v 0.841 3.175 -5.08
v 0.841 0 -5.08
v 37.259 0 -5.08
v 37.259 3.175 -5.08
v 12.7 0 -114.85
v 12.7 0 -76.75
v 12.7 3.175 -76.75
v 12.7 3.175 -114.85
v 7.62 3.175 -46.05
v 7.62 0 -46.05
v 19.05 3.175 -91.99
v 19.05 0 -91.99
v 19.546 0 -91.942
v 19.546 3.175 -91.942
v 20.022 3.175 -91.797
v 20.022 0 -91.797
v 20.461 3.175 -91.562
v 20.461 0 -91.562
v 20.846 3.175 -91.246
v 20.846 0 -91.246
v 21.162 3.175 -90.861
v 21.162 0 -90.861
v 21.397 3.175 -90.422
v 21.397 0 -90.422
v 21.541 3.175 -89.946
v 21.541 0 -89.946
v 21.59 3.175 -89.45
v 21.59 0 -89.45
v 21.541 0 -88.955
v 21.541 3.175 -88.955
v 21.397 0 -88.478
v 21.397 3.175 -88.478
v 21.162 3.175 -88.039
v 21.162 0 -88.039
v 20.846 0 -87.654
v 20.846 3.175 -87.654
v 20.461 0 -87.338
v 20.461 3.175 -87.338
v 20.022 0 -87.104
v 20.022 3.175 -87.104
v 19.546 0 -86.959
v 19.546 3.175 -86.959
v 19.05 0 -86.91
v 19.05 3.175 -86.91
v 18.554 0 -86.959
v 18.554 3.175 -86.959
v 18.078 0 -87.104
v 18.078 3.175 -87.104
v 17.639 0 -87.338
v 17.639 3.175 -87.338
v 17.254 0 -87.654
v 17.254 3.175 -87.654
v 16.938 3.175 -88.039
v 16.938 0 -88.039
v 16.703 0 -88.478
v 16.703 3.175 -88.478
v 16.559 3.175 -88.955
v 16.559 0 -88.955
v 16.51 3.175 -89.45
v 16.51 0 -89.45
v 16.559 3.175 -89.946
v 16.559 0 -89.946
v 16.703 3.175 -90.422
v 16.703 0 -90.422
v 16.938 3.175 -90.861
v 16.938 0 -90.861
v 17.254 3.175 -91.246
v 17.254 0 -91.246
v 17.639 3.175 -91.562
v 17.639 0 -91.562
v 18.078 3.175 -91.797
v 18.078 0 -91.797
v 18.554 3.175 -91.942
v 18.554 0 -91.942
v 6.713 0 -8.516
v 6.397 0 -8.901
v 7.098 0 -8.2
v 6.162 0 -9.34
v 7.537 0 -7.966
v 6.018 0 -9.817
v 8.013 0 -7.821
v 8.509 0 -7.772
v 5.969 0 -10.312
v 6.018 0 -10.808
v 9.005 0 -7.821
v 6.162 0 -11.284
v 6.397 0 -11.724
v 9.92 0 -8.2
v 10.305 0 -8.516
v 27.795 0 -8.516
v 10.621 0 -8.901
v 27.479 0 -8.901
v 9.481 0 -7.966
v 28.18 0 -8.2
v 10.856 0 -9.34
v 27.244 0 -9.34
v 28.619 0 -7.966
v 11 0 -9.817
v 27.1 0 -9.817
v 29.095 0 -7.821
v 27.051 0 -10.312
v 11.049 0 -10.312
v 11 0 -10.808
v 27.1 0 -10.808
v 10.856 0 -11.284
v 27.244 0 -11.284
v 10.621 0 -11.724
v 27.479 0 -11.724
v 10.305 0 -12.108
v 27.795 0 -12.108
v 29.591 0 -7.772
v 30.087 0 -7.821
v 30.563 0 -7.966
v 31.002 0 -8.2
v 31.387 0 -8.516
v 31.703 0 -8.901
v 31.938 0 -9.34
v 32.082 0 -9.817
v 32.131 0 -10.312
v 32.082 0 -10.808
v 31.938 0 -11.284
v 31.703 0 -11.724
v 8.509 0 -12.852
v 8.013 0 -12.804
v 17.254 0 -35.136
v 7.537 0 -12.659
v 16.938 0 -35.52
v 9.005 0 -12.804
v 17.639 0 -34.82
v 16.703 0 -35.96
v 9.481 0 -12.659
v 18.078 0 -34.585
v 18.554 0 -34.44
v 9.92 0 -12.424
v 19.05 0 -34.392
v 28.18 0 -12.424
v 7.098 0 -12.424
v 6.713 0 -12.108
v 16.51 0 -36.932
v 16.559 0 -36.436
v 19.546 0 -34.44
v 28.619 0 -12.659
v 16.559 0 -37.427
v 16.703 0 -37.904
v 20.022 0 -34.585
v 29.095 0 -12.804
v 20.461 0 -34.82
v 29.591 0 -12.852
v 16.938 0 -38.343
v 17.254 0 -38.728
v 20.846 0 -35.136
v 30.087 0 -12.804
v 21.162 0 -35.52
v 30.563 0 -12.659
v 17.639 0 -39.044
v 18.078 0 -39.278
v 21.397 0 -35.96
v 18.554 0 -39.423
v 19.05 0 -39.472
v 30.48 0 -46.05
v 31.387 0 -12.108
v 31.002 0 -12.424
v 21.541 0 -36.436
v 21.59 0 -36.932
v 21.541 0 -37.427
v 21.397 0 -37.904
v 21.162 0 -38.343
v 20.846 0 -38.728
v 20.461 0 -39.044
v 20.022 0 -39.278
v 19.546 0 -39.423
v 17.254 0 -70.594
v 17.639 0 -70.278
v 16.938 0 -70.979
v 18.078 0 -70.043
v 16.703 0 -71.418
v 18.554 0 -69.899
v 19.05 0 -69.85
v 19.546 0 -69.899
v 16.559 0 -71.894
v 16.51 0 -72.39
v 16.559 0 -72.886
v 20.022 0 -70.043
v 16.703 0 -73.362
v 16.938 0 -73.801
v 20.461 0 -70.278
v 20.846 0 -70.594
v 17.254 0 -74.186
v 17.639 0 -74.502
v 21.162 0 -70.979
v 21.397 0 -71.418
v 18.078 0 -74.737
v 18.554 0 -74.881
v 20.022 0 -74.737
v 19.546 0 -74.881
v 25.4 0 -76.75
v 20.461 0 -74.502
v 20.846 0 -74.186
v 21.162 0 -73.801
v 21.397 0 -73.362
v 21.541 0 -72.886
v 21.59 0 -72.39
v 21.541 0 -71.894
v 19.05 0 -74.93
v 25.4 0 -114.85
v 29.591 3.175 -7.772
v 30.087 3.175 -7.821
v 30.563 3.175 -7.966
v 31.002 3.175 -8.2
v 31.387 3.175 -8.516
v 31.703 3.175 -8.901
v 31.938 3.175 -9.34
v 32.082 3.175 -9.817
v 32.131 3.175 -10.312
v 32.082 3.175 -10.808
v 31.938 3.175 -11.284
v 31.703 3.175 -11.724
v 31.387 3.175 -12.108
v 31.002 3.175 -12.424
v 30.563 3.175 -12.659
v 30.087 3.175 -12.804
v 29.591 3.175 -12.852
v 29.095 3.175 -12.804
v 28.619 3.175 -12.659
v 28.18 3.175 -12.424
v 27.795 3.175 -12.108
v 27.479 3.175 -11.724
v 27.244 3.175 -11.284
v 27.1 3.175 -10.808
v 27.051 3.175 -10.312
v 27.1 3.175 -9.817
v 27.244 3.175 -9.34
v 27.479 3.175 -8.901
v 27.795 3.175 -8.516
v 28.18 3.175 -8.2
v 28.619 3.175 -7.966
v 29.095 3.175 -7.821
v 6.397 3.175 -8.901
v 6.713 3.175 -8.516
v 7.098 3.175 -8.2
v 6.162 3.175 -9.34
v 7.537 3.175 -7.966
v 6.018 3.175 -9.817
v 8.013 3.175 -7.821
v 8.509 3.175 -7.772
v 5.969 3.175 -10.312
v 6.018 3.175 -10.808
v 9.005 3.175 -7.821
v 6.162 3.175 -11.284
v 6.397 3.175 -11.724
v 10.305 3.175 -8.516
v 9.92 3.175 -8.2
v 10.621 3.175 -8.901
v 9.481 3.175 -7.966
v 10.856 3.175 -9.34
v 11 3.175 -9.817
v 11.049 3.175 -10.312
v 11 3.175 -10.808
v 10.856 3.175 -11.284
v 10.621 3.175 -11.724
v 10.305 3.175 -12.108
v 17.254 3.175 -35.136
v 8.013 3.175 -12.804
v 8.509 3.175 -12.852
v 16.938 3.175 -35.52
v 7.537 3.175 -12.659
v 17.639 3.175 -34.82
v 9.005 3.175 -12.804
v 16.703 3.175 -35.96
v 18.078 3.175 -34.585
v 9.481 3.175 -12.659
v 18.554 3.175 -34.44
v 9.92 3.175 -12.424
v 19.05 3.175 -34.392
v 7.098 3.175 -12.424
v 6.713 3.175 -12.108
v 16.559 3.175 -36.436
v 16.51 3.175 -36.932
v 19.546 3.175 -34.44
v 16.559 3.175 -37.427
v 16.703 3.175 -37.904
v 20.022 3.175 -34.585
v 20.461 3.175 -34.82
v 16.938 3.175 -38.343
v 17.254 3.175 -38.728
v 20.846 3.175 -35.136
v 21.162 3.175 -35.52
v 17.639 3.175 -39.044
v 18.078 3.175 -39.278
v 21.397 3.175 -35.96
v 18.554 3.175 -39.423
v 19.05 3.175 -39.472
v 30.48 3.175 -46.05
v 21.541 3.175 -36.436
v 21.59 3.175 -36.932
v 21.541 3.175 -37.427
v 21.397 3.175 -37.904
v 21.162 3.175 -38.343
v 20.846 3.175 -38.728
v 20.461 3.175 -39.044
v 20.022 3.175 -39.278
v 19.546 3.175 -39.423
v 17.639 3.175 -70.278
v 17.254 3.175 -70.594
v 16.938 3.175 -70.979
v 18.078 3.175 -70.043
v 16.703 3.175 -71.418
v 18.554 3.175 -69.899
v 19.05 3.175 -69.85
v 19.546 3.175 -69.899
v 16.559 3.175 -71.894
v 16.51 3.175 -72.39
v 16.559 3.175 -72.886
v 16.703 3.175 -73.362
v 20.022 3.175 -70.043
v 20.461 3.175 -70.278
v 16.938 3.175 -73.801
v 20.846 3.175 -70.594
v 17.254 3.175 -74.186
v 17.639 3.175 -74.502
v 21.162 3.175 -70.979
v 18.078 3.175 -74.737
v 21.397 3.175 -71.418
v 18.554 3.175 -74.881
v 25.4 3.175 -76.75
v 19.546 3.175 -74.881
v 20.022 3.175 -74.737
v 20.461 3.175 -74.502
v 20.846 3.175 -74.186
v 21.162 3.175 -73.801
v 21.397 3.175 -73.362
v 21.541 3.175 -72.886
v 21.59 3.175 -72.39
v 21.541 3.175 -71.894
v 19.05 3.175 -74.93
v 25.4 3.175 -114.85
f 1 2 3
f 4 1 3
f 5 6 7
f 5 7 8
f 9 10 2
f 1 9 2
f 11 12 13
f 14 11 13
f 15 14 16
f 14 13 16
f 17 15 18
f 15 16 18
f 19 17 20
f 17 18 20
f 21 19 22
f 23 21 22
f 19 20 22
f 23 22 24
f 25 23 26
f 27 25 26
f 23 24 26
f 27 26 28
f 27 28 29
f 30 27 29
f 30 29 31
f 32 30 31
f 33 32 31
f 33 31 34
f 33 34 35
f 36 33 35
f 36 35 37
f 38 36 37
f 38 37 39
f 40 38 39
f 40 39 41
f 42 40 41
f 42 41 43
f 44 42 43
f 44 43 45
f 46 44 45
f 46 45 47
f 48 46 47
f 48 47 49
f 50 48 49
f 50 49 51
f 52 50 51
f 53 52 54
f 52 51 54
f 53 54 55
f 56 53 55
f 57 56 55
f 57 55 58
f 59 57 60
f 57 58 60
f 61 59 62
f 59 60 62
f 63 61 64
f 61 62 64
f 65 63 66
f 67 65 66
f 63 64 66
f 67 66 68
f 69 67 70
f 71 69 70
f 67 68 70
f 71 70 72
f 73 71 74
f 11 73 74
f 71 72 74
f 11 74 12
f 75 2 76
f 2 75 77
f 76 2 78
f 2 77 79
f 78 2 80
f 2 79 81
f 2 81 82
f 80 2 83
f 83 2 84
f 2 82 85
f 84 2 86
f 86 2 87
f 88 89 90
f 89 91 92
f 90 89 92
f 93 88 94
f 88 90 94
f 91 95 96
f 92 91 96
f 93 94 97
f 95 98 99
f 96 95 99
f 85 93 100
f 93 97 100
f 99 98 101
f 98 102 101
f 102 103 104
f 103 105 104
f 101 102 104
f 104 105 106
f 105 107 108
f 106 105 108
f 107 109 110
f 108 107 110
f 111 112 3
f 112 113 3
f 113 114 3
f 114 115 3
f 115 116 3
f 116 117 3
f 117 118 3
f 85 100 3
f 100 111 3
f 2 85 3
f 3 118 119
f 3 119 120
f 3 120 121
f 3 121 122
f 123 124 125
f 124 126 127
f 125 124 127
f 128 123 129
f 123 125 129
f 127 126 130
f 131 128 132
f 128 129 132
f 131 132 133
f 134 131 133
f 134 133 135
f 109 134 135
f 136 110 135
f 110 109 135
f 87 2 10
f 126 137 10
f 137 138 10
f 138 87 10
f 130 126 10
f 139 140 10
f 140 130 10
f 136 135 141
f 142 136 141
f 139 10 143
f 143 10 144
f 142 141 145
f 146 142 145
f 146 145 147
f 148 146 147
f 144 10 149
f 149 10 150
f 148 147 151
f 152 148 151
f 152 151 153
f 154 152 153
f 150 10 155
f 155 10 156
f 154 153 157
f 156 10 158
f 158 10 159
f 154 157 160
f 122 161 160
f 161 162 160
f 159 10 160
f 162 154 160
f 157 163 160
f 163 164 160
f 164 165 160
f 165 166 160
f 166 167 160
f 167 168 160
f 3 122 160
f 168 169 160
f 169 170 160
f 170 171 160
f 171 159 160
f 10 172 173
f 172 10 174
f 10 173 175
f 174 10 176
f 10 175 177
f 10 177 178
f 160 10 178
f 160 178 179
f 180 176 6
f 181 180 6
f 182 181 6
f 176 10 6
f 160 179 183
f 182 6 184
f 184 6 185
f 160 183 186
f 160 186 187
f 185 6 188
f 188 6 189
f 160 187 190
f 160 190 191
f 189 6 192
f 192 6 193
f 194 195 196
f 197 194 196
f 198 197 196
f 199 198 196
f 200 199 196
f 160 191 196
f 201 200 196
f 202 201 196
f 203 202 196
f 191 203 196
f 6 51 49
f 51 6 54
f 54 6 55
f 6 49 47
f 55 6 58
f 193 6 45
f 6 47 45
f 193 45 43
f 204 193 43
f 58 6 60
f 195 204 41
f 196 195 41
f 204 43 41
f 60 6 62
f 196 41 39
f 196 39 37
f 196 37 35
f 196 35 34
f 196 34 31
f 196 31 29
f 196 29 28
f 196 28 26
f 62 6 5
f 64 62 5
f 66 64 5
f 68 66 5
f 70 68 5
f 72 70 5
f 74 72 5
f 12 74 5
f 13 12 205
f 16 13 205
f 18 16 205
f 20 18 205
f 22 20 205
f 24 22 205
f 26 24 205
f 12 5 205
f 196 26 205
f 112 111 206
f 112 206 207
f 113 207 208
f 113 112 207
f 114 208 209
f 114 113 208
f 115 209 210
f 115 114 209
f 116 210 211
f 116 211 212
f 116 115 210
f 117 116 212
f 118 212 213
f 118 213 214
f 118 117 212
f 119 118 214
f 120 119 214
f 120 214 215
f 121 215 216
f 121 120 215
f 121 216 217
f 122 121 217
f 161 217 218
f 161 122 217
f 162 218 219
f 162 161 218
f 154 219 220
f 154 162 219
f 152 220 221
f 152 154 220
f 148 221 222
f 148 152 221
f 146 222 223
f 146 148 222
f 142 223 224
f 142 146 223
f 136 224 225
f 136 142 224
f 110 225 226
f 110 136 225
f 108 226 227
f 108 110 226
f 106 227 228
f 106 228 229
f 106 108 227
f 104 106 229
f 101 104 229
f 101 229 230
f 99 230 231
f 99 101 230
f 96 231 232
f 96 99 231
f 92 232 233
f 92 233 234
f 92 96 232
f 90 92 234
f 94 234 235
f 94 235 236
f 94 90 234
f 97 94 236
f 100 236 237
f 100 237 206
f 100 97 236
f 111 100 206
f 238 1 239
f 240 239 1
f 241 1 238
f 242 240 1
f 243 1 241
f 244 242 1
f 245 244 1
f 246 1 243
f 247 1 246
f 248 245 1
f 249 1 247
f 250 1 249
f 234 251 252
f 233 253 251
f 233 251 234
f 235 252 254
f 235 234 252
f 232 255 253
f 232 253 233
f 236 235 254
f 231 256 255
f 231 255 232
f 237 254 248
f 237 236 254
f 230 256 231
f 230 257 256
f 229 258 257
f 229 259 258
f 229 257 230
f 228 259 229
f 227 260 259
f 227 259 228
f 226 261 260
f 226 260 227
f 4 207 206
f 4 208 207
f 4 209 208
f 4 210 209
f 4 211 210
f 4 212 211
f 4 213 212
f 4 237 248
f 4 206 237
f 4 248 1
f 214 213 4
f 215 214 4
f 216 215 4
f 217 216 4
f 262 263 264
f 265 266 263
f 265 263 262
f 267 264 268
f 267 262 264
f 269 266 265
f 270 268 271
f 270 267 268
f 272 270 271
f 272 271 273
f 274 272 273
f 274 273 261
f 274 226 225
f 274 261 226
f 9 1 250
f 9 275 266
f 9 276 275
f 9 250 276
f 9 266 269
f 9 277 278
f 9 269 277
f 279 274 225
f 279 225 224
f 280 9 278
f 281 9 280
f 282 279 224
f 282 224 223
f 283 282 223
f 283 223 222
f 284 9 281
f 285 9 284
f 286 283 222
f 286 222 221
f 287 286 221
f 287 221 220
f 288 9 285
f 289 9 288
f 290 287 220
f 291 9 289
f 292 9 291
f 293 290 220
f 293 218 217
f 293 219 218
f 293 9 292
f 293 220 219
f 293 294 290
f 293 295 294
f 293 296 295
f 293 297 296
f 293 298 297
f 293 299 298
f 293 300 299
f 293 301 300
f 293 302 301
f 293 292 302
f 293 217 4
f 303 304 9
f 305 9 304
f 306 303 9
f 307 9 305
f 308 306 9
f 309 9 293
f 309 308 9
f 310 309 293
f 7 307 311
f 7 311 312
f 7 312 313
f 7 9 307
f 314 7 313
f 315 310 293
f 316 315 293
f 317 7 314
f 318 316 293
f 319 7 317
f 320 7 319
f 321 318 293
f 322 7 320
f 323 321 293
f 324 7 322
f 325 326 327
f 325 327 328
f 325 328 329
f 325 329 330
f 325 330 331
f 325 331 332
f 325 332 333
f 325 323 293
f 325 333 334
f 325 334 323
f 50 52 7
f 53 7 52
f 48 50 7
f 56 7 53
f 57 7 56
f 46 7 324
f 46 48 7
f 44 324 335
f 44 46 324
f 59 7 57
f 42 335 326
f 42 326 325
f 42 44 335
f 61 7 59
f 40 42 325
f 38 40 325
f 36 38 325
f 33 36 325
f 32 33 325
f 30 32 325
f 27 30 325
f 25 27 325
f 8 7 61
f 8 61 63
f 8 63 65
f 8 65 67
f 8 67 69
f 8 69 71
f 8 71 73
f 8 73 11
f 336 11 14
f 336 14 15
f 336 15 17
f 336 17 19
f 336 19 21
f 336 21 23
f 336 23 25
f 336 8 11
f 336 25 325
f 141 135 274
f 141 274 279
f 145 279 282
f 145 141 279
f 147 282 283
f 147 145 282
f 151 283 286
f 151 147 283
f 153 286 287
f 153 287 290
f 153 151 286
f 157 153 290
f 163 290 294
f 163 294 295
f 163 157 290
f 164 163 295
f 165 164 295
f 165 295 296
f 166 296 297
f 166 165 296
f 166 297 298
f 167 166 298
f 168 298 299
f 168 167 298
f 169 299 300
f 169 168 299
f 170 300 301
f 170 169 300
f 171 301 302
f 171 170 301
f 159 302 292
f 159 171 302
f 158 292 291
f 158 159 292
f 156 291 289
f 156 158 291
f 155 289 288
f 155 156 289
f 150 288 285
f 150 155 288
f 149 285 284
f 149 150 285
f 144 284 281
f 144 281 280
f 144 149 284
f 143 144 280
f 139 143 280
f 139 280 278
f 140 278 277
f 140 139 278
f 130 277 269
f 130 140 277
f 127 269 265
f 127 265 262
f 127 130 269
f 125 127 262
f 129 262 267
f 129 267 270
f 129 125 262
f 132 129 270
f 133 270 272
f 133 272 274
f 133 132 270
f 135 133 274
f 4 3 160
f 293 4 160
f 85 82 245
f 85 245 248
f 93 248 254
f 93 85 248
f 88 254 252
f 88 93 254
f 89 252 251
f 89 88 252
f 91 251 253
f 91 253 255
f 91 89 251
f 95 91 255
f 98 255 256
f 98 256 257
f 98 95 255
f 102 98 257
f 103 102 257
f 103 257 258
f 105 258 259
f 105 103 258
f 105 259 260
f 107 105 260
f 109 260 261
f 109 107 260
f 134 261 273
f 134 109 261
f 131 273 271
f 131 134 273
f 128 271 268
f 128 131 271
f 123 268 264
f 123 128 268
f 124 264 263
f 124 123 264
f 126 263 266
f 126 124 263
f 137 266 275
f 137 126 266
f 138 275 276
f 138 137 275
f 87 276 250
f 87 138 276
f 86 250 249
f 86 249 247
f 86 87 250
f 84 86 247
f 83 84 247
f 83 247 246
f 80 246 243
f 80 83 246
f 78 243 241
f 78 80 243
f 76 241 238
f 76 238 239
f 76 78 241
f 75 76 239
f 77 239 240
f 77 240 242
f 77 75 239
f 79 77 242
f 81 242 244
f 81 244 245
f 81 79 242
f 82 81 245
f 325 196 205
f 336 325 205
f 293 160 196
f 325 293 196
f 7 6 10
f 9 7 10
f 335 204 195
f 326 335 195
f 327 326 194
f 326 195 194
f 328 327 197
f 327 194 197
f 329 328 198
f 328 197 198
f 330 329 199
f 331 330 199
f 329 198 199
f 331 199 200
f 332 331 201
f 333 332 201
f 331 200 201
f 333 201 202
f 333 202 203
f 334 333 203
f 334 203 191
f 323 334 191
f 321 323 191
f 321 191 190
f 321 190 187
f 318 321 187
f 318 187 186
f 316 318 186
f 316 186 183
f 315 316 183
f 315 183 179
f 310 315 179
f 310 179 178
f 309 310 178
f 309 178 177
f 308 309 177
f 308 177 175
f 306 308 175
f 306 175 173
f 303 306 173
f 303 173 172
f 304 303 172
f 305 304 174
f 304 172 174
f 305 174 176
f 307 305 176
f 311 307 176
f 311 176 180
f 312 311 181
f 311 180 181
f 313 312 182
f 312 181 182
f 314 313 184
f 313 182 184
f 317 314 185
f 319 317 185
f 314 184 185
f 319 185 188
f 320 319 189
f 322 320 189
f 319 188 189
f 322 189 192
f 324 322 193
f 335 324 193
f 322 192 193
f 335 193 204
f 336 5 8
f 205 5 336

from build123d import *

# Parameters (mm, degrees)
SKETCH1_R           = 2.54
SKETCH1_W           = 12.7
SKETCH1_H           = 38.1
BOSS_EXTRUDE1_DEPTH = 3.175
SKETCH4_R           = 2.54
CUT_EXTRUDE2_DEPTH  = 25.4


with BuildPart() as part:
    # Sketch1 → Boss-Extrude1 (new body)
    # profile 1 of 3: a face of its own
    with BuildSketch(Plane(origin=(0, 0, 0), x_dir=(1, 0, 0), z_dir=(0, 1, 0))):
        Polygon((0.840595698, 5.08), (19.05, 5.08), (37.259404302, 5.08), (30.48, 46.0502), (7.62, 46.0502), align=None)
        with Locations(Location((8.509, 10.3124, 0), (0, 0, 270))):
            Circle(SKETCH1_R, mode=Mode.SUBTRACT)
        with Locations(Location((29.591, 10.3124, 0), (0, 0, 270))):
            Circle(SKETCH1_R, mode=Mode.SUBTRACT)
        with Locations(Location((19.05, 36.9316, 0), (0, 0, 270))):
            Circle(SKETCH1_R, mode=Mode.SUBTRACT)
    # profile 2 of 3: a face of its own
    with BuildSketch(Plane(origin=(0, 0, 0), x_dir=(1, 0, 0), z_dir=(0, 1, 0))):
        Polygon((12.7, 76.750333333), (7.62, 46.0502), (30.48, 46.0502), (25.4, 76.750333333), align=None)
    # profile 3 of 3: a face of its own
    with BuildSketch(Plane(origin=(0, 0, 0), x_dir=(1, 0, 0), z_dir=(0, 1, 0))):
        with Locations((19.05, 95.800333333)):
            Rectangle(SKETCH1_W, SKETCH1_H)
    extrude(amount=BOSS_EXTRUDE1_DEPTH)

    # Sketch4 → Cut-Extrude2 (cut)
    with BuildSketch(Plane.XZ):
        with Locations(Location((19.05, -72.39, 0), (0, 0, 270))):
            Circle(SKETCH4_R)
        with Locations(Location((19.05, -89.450333333, 0), (0, 0, 270))):
            Circle(SKETCH4_R)
    extrude(amount=-CUT_EXTRUDE2_DEPTH, mode=Mode.SUBTRACT)


solid = part.part
